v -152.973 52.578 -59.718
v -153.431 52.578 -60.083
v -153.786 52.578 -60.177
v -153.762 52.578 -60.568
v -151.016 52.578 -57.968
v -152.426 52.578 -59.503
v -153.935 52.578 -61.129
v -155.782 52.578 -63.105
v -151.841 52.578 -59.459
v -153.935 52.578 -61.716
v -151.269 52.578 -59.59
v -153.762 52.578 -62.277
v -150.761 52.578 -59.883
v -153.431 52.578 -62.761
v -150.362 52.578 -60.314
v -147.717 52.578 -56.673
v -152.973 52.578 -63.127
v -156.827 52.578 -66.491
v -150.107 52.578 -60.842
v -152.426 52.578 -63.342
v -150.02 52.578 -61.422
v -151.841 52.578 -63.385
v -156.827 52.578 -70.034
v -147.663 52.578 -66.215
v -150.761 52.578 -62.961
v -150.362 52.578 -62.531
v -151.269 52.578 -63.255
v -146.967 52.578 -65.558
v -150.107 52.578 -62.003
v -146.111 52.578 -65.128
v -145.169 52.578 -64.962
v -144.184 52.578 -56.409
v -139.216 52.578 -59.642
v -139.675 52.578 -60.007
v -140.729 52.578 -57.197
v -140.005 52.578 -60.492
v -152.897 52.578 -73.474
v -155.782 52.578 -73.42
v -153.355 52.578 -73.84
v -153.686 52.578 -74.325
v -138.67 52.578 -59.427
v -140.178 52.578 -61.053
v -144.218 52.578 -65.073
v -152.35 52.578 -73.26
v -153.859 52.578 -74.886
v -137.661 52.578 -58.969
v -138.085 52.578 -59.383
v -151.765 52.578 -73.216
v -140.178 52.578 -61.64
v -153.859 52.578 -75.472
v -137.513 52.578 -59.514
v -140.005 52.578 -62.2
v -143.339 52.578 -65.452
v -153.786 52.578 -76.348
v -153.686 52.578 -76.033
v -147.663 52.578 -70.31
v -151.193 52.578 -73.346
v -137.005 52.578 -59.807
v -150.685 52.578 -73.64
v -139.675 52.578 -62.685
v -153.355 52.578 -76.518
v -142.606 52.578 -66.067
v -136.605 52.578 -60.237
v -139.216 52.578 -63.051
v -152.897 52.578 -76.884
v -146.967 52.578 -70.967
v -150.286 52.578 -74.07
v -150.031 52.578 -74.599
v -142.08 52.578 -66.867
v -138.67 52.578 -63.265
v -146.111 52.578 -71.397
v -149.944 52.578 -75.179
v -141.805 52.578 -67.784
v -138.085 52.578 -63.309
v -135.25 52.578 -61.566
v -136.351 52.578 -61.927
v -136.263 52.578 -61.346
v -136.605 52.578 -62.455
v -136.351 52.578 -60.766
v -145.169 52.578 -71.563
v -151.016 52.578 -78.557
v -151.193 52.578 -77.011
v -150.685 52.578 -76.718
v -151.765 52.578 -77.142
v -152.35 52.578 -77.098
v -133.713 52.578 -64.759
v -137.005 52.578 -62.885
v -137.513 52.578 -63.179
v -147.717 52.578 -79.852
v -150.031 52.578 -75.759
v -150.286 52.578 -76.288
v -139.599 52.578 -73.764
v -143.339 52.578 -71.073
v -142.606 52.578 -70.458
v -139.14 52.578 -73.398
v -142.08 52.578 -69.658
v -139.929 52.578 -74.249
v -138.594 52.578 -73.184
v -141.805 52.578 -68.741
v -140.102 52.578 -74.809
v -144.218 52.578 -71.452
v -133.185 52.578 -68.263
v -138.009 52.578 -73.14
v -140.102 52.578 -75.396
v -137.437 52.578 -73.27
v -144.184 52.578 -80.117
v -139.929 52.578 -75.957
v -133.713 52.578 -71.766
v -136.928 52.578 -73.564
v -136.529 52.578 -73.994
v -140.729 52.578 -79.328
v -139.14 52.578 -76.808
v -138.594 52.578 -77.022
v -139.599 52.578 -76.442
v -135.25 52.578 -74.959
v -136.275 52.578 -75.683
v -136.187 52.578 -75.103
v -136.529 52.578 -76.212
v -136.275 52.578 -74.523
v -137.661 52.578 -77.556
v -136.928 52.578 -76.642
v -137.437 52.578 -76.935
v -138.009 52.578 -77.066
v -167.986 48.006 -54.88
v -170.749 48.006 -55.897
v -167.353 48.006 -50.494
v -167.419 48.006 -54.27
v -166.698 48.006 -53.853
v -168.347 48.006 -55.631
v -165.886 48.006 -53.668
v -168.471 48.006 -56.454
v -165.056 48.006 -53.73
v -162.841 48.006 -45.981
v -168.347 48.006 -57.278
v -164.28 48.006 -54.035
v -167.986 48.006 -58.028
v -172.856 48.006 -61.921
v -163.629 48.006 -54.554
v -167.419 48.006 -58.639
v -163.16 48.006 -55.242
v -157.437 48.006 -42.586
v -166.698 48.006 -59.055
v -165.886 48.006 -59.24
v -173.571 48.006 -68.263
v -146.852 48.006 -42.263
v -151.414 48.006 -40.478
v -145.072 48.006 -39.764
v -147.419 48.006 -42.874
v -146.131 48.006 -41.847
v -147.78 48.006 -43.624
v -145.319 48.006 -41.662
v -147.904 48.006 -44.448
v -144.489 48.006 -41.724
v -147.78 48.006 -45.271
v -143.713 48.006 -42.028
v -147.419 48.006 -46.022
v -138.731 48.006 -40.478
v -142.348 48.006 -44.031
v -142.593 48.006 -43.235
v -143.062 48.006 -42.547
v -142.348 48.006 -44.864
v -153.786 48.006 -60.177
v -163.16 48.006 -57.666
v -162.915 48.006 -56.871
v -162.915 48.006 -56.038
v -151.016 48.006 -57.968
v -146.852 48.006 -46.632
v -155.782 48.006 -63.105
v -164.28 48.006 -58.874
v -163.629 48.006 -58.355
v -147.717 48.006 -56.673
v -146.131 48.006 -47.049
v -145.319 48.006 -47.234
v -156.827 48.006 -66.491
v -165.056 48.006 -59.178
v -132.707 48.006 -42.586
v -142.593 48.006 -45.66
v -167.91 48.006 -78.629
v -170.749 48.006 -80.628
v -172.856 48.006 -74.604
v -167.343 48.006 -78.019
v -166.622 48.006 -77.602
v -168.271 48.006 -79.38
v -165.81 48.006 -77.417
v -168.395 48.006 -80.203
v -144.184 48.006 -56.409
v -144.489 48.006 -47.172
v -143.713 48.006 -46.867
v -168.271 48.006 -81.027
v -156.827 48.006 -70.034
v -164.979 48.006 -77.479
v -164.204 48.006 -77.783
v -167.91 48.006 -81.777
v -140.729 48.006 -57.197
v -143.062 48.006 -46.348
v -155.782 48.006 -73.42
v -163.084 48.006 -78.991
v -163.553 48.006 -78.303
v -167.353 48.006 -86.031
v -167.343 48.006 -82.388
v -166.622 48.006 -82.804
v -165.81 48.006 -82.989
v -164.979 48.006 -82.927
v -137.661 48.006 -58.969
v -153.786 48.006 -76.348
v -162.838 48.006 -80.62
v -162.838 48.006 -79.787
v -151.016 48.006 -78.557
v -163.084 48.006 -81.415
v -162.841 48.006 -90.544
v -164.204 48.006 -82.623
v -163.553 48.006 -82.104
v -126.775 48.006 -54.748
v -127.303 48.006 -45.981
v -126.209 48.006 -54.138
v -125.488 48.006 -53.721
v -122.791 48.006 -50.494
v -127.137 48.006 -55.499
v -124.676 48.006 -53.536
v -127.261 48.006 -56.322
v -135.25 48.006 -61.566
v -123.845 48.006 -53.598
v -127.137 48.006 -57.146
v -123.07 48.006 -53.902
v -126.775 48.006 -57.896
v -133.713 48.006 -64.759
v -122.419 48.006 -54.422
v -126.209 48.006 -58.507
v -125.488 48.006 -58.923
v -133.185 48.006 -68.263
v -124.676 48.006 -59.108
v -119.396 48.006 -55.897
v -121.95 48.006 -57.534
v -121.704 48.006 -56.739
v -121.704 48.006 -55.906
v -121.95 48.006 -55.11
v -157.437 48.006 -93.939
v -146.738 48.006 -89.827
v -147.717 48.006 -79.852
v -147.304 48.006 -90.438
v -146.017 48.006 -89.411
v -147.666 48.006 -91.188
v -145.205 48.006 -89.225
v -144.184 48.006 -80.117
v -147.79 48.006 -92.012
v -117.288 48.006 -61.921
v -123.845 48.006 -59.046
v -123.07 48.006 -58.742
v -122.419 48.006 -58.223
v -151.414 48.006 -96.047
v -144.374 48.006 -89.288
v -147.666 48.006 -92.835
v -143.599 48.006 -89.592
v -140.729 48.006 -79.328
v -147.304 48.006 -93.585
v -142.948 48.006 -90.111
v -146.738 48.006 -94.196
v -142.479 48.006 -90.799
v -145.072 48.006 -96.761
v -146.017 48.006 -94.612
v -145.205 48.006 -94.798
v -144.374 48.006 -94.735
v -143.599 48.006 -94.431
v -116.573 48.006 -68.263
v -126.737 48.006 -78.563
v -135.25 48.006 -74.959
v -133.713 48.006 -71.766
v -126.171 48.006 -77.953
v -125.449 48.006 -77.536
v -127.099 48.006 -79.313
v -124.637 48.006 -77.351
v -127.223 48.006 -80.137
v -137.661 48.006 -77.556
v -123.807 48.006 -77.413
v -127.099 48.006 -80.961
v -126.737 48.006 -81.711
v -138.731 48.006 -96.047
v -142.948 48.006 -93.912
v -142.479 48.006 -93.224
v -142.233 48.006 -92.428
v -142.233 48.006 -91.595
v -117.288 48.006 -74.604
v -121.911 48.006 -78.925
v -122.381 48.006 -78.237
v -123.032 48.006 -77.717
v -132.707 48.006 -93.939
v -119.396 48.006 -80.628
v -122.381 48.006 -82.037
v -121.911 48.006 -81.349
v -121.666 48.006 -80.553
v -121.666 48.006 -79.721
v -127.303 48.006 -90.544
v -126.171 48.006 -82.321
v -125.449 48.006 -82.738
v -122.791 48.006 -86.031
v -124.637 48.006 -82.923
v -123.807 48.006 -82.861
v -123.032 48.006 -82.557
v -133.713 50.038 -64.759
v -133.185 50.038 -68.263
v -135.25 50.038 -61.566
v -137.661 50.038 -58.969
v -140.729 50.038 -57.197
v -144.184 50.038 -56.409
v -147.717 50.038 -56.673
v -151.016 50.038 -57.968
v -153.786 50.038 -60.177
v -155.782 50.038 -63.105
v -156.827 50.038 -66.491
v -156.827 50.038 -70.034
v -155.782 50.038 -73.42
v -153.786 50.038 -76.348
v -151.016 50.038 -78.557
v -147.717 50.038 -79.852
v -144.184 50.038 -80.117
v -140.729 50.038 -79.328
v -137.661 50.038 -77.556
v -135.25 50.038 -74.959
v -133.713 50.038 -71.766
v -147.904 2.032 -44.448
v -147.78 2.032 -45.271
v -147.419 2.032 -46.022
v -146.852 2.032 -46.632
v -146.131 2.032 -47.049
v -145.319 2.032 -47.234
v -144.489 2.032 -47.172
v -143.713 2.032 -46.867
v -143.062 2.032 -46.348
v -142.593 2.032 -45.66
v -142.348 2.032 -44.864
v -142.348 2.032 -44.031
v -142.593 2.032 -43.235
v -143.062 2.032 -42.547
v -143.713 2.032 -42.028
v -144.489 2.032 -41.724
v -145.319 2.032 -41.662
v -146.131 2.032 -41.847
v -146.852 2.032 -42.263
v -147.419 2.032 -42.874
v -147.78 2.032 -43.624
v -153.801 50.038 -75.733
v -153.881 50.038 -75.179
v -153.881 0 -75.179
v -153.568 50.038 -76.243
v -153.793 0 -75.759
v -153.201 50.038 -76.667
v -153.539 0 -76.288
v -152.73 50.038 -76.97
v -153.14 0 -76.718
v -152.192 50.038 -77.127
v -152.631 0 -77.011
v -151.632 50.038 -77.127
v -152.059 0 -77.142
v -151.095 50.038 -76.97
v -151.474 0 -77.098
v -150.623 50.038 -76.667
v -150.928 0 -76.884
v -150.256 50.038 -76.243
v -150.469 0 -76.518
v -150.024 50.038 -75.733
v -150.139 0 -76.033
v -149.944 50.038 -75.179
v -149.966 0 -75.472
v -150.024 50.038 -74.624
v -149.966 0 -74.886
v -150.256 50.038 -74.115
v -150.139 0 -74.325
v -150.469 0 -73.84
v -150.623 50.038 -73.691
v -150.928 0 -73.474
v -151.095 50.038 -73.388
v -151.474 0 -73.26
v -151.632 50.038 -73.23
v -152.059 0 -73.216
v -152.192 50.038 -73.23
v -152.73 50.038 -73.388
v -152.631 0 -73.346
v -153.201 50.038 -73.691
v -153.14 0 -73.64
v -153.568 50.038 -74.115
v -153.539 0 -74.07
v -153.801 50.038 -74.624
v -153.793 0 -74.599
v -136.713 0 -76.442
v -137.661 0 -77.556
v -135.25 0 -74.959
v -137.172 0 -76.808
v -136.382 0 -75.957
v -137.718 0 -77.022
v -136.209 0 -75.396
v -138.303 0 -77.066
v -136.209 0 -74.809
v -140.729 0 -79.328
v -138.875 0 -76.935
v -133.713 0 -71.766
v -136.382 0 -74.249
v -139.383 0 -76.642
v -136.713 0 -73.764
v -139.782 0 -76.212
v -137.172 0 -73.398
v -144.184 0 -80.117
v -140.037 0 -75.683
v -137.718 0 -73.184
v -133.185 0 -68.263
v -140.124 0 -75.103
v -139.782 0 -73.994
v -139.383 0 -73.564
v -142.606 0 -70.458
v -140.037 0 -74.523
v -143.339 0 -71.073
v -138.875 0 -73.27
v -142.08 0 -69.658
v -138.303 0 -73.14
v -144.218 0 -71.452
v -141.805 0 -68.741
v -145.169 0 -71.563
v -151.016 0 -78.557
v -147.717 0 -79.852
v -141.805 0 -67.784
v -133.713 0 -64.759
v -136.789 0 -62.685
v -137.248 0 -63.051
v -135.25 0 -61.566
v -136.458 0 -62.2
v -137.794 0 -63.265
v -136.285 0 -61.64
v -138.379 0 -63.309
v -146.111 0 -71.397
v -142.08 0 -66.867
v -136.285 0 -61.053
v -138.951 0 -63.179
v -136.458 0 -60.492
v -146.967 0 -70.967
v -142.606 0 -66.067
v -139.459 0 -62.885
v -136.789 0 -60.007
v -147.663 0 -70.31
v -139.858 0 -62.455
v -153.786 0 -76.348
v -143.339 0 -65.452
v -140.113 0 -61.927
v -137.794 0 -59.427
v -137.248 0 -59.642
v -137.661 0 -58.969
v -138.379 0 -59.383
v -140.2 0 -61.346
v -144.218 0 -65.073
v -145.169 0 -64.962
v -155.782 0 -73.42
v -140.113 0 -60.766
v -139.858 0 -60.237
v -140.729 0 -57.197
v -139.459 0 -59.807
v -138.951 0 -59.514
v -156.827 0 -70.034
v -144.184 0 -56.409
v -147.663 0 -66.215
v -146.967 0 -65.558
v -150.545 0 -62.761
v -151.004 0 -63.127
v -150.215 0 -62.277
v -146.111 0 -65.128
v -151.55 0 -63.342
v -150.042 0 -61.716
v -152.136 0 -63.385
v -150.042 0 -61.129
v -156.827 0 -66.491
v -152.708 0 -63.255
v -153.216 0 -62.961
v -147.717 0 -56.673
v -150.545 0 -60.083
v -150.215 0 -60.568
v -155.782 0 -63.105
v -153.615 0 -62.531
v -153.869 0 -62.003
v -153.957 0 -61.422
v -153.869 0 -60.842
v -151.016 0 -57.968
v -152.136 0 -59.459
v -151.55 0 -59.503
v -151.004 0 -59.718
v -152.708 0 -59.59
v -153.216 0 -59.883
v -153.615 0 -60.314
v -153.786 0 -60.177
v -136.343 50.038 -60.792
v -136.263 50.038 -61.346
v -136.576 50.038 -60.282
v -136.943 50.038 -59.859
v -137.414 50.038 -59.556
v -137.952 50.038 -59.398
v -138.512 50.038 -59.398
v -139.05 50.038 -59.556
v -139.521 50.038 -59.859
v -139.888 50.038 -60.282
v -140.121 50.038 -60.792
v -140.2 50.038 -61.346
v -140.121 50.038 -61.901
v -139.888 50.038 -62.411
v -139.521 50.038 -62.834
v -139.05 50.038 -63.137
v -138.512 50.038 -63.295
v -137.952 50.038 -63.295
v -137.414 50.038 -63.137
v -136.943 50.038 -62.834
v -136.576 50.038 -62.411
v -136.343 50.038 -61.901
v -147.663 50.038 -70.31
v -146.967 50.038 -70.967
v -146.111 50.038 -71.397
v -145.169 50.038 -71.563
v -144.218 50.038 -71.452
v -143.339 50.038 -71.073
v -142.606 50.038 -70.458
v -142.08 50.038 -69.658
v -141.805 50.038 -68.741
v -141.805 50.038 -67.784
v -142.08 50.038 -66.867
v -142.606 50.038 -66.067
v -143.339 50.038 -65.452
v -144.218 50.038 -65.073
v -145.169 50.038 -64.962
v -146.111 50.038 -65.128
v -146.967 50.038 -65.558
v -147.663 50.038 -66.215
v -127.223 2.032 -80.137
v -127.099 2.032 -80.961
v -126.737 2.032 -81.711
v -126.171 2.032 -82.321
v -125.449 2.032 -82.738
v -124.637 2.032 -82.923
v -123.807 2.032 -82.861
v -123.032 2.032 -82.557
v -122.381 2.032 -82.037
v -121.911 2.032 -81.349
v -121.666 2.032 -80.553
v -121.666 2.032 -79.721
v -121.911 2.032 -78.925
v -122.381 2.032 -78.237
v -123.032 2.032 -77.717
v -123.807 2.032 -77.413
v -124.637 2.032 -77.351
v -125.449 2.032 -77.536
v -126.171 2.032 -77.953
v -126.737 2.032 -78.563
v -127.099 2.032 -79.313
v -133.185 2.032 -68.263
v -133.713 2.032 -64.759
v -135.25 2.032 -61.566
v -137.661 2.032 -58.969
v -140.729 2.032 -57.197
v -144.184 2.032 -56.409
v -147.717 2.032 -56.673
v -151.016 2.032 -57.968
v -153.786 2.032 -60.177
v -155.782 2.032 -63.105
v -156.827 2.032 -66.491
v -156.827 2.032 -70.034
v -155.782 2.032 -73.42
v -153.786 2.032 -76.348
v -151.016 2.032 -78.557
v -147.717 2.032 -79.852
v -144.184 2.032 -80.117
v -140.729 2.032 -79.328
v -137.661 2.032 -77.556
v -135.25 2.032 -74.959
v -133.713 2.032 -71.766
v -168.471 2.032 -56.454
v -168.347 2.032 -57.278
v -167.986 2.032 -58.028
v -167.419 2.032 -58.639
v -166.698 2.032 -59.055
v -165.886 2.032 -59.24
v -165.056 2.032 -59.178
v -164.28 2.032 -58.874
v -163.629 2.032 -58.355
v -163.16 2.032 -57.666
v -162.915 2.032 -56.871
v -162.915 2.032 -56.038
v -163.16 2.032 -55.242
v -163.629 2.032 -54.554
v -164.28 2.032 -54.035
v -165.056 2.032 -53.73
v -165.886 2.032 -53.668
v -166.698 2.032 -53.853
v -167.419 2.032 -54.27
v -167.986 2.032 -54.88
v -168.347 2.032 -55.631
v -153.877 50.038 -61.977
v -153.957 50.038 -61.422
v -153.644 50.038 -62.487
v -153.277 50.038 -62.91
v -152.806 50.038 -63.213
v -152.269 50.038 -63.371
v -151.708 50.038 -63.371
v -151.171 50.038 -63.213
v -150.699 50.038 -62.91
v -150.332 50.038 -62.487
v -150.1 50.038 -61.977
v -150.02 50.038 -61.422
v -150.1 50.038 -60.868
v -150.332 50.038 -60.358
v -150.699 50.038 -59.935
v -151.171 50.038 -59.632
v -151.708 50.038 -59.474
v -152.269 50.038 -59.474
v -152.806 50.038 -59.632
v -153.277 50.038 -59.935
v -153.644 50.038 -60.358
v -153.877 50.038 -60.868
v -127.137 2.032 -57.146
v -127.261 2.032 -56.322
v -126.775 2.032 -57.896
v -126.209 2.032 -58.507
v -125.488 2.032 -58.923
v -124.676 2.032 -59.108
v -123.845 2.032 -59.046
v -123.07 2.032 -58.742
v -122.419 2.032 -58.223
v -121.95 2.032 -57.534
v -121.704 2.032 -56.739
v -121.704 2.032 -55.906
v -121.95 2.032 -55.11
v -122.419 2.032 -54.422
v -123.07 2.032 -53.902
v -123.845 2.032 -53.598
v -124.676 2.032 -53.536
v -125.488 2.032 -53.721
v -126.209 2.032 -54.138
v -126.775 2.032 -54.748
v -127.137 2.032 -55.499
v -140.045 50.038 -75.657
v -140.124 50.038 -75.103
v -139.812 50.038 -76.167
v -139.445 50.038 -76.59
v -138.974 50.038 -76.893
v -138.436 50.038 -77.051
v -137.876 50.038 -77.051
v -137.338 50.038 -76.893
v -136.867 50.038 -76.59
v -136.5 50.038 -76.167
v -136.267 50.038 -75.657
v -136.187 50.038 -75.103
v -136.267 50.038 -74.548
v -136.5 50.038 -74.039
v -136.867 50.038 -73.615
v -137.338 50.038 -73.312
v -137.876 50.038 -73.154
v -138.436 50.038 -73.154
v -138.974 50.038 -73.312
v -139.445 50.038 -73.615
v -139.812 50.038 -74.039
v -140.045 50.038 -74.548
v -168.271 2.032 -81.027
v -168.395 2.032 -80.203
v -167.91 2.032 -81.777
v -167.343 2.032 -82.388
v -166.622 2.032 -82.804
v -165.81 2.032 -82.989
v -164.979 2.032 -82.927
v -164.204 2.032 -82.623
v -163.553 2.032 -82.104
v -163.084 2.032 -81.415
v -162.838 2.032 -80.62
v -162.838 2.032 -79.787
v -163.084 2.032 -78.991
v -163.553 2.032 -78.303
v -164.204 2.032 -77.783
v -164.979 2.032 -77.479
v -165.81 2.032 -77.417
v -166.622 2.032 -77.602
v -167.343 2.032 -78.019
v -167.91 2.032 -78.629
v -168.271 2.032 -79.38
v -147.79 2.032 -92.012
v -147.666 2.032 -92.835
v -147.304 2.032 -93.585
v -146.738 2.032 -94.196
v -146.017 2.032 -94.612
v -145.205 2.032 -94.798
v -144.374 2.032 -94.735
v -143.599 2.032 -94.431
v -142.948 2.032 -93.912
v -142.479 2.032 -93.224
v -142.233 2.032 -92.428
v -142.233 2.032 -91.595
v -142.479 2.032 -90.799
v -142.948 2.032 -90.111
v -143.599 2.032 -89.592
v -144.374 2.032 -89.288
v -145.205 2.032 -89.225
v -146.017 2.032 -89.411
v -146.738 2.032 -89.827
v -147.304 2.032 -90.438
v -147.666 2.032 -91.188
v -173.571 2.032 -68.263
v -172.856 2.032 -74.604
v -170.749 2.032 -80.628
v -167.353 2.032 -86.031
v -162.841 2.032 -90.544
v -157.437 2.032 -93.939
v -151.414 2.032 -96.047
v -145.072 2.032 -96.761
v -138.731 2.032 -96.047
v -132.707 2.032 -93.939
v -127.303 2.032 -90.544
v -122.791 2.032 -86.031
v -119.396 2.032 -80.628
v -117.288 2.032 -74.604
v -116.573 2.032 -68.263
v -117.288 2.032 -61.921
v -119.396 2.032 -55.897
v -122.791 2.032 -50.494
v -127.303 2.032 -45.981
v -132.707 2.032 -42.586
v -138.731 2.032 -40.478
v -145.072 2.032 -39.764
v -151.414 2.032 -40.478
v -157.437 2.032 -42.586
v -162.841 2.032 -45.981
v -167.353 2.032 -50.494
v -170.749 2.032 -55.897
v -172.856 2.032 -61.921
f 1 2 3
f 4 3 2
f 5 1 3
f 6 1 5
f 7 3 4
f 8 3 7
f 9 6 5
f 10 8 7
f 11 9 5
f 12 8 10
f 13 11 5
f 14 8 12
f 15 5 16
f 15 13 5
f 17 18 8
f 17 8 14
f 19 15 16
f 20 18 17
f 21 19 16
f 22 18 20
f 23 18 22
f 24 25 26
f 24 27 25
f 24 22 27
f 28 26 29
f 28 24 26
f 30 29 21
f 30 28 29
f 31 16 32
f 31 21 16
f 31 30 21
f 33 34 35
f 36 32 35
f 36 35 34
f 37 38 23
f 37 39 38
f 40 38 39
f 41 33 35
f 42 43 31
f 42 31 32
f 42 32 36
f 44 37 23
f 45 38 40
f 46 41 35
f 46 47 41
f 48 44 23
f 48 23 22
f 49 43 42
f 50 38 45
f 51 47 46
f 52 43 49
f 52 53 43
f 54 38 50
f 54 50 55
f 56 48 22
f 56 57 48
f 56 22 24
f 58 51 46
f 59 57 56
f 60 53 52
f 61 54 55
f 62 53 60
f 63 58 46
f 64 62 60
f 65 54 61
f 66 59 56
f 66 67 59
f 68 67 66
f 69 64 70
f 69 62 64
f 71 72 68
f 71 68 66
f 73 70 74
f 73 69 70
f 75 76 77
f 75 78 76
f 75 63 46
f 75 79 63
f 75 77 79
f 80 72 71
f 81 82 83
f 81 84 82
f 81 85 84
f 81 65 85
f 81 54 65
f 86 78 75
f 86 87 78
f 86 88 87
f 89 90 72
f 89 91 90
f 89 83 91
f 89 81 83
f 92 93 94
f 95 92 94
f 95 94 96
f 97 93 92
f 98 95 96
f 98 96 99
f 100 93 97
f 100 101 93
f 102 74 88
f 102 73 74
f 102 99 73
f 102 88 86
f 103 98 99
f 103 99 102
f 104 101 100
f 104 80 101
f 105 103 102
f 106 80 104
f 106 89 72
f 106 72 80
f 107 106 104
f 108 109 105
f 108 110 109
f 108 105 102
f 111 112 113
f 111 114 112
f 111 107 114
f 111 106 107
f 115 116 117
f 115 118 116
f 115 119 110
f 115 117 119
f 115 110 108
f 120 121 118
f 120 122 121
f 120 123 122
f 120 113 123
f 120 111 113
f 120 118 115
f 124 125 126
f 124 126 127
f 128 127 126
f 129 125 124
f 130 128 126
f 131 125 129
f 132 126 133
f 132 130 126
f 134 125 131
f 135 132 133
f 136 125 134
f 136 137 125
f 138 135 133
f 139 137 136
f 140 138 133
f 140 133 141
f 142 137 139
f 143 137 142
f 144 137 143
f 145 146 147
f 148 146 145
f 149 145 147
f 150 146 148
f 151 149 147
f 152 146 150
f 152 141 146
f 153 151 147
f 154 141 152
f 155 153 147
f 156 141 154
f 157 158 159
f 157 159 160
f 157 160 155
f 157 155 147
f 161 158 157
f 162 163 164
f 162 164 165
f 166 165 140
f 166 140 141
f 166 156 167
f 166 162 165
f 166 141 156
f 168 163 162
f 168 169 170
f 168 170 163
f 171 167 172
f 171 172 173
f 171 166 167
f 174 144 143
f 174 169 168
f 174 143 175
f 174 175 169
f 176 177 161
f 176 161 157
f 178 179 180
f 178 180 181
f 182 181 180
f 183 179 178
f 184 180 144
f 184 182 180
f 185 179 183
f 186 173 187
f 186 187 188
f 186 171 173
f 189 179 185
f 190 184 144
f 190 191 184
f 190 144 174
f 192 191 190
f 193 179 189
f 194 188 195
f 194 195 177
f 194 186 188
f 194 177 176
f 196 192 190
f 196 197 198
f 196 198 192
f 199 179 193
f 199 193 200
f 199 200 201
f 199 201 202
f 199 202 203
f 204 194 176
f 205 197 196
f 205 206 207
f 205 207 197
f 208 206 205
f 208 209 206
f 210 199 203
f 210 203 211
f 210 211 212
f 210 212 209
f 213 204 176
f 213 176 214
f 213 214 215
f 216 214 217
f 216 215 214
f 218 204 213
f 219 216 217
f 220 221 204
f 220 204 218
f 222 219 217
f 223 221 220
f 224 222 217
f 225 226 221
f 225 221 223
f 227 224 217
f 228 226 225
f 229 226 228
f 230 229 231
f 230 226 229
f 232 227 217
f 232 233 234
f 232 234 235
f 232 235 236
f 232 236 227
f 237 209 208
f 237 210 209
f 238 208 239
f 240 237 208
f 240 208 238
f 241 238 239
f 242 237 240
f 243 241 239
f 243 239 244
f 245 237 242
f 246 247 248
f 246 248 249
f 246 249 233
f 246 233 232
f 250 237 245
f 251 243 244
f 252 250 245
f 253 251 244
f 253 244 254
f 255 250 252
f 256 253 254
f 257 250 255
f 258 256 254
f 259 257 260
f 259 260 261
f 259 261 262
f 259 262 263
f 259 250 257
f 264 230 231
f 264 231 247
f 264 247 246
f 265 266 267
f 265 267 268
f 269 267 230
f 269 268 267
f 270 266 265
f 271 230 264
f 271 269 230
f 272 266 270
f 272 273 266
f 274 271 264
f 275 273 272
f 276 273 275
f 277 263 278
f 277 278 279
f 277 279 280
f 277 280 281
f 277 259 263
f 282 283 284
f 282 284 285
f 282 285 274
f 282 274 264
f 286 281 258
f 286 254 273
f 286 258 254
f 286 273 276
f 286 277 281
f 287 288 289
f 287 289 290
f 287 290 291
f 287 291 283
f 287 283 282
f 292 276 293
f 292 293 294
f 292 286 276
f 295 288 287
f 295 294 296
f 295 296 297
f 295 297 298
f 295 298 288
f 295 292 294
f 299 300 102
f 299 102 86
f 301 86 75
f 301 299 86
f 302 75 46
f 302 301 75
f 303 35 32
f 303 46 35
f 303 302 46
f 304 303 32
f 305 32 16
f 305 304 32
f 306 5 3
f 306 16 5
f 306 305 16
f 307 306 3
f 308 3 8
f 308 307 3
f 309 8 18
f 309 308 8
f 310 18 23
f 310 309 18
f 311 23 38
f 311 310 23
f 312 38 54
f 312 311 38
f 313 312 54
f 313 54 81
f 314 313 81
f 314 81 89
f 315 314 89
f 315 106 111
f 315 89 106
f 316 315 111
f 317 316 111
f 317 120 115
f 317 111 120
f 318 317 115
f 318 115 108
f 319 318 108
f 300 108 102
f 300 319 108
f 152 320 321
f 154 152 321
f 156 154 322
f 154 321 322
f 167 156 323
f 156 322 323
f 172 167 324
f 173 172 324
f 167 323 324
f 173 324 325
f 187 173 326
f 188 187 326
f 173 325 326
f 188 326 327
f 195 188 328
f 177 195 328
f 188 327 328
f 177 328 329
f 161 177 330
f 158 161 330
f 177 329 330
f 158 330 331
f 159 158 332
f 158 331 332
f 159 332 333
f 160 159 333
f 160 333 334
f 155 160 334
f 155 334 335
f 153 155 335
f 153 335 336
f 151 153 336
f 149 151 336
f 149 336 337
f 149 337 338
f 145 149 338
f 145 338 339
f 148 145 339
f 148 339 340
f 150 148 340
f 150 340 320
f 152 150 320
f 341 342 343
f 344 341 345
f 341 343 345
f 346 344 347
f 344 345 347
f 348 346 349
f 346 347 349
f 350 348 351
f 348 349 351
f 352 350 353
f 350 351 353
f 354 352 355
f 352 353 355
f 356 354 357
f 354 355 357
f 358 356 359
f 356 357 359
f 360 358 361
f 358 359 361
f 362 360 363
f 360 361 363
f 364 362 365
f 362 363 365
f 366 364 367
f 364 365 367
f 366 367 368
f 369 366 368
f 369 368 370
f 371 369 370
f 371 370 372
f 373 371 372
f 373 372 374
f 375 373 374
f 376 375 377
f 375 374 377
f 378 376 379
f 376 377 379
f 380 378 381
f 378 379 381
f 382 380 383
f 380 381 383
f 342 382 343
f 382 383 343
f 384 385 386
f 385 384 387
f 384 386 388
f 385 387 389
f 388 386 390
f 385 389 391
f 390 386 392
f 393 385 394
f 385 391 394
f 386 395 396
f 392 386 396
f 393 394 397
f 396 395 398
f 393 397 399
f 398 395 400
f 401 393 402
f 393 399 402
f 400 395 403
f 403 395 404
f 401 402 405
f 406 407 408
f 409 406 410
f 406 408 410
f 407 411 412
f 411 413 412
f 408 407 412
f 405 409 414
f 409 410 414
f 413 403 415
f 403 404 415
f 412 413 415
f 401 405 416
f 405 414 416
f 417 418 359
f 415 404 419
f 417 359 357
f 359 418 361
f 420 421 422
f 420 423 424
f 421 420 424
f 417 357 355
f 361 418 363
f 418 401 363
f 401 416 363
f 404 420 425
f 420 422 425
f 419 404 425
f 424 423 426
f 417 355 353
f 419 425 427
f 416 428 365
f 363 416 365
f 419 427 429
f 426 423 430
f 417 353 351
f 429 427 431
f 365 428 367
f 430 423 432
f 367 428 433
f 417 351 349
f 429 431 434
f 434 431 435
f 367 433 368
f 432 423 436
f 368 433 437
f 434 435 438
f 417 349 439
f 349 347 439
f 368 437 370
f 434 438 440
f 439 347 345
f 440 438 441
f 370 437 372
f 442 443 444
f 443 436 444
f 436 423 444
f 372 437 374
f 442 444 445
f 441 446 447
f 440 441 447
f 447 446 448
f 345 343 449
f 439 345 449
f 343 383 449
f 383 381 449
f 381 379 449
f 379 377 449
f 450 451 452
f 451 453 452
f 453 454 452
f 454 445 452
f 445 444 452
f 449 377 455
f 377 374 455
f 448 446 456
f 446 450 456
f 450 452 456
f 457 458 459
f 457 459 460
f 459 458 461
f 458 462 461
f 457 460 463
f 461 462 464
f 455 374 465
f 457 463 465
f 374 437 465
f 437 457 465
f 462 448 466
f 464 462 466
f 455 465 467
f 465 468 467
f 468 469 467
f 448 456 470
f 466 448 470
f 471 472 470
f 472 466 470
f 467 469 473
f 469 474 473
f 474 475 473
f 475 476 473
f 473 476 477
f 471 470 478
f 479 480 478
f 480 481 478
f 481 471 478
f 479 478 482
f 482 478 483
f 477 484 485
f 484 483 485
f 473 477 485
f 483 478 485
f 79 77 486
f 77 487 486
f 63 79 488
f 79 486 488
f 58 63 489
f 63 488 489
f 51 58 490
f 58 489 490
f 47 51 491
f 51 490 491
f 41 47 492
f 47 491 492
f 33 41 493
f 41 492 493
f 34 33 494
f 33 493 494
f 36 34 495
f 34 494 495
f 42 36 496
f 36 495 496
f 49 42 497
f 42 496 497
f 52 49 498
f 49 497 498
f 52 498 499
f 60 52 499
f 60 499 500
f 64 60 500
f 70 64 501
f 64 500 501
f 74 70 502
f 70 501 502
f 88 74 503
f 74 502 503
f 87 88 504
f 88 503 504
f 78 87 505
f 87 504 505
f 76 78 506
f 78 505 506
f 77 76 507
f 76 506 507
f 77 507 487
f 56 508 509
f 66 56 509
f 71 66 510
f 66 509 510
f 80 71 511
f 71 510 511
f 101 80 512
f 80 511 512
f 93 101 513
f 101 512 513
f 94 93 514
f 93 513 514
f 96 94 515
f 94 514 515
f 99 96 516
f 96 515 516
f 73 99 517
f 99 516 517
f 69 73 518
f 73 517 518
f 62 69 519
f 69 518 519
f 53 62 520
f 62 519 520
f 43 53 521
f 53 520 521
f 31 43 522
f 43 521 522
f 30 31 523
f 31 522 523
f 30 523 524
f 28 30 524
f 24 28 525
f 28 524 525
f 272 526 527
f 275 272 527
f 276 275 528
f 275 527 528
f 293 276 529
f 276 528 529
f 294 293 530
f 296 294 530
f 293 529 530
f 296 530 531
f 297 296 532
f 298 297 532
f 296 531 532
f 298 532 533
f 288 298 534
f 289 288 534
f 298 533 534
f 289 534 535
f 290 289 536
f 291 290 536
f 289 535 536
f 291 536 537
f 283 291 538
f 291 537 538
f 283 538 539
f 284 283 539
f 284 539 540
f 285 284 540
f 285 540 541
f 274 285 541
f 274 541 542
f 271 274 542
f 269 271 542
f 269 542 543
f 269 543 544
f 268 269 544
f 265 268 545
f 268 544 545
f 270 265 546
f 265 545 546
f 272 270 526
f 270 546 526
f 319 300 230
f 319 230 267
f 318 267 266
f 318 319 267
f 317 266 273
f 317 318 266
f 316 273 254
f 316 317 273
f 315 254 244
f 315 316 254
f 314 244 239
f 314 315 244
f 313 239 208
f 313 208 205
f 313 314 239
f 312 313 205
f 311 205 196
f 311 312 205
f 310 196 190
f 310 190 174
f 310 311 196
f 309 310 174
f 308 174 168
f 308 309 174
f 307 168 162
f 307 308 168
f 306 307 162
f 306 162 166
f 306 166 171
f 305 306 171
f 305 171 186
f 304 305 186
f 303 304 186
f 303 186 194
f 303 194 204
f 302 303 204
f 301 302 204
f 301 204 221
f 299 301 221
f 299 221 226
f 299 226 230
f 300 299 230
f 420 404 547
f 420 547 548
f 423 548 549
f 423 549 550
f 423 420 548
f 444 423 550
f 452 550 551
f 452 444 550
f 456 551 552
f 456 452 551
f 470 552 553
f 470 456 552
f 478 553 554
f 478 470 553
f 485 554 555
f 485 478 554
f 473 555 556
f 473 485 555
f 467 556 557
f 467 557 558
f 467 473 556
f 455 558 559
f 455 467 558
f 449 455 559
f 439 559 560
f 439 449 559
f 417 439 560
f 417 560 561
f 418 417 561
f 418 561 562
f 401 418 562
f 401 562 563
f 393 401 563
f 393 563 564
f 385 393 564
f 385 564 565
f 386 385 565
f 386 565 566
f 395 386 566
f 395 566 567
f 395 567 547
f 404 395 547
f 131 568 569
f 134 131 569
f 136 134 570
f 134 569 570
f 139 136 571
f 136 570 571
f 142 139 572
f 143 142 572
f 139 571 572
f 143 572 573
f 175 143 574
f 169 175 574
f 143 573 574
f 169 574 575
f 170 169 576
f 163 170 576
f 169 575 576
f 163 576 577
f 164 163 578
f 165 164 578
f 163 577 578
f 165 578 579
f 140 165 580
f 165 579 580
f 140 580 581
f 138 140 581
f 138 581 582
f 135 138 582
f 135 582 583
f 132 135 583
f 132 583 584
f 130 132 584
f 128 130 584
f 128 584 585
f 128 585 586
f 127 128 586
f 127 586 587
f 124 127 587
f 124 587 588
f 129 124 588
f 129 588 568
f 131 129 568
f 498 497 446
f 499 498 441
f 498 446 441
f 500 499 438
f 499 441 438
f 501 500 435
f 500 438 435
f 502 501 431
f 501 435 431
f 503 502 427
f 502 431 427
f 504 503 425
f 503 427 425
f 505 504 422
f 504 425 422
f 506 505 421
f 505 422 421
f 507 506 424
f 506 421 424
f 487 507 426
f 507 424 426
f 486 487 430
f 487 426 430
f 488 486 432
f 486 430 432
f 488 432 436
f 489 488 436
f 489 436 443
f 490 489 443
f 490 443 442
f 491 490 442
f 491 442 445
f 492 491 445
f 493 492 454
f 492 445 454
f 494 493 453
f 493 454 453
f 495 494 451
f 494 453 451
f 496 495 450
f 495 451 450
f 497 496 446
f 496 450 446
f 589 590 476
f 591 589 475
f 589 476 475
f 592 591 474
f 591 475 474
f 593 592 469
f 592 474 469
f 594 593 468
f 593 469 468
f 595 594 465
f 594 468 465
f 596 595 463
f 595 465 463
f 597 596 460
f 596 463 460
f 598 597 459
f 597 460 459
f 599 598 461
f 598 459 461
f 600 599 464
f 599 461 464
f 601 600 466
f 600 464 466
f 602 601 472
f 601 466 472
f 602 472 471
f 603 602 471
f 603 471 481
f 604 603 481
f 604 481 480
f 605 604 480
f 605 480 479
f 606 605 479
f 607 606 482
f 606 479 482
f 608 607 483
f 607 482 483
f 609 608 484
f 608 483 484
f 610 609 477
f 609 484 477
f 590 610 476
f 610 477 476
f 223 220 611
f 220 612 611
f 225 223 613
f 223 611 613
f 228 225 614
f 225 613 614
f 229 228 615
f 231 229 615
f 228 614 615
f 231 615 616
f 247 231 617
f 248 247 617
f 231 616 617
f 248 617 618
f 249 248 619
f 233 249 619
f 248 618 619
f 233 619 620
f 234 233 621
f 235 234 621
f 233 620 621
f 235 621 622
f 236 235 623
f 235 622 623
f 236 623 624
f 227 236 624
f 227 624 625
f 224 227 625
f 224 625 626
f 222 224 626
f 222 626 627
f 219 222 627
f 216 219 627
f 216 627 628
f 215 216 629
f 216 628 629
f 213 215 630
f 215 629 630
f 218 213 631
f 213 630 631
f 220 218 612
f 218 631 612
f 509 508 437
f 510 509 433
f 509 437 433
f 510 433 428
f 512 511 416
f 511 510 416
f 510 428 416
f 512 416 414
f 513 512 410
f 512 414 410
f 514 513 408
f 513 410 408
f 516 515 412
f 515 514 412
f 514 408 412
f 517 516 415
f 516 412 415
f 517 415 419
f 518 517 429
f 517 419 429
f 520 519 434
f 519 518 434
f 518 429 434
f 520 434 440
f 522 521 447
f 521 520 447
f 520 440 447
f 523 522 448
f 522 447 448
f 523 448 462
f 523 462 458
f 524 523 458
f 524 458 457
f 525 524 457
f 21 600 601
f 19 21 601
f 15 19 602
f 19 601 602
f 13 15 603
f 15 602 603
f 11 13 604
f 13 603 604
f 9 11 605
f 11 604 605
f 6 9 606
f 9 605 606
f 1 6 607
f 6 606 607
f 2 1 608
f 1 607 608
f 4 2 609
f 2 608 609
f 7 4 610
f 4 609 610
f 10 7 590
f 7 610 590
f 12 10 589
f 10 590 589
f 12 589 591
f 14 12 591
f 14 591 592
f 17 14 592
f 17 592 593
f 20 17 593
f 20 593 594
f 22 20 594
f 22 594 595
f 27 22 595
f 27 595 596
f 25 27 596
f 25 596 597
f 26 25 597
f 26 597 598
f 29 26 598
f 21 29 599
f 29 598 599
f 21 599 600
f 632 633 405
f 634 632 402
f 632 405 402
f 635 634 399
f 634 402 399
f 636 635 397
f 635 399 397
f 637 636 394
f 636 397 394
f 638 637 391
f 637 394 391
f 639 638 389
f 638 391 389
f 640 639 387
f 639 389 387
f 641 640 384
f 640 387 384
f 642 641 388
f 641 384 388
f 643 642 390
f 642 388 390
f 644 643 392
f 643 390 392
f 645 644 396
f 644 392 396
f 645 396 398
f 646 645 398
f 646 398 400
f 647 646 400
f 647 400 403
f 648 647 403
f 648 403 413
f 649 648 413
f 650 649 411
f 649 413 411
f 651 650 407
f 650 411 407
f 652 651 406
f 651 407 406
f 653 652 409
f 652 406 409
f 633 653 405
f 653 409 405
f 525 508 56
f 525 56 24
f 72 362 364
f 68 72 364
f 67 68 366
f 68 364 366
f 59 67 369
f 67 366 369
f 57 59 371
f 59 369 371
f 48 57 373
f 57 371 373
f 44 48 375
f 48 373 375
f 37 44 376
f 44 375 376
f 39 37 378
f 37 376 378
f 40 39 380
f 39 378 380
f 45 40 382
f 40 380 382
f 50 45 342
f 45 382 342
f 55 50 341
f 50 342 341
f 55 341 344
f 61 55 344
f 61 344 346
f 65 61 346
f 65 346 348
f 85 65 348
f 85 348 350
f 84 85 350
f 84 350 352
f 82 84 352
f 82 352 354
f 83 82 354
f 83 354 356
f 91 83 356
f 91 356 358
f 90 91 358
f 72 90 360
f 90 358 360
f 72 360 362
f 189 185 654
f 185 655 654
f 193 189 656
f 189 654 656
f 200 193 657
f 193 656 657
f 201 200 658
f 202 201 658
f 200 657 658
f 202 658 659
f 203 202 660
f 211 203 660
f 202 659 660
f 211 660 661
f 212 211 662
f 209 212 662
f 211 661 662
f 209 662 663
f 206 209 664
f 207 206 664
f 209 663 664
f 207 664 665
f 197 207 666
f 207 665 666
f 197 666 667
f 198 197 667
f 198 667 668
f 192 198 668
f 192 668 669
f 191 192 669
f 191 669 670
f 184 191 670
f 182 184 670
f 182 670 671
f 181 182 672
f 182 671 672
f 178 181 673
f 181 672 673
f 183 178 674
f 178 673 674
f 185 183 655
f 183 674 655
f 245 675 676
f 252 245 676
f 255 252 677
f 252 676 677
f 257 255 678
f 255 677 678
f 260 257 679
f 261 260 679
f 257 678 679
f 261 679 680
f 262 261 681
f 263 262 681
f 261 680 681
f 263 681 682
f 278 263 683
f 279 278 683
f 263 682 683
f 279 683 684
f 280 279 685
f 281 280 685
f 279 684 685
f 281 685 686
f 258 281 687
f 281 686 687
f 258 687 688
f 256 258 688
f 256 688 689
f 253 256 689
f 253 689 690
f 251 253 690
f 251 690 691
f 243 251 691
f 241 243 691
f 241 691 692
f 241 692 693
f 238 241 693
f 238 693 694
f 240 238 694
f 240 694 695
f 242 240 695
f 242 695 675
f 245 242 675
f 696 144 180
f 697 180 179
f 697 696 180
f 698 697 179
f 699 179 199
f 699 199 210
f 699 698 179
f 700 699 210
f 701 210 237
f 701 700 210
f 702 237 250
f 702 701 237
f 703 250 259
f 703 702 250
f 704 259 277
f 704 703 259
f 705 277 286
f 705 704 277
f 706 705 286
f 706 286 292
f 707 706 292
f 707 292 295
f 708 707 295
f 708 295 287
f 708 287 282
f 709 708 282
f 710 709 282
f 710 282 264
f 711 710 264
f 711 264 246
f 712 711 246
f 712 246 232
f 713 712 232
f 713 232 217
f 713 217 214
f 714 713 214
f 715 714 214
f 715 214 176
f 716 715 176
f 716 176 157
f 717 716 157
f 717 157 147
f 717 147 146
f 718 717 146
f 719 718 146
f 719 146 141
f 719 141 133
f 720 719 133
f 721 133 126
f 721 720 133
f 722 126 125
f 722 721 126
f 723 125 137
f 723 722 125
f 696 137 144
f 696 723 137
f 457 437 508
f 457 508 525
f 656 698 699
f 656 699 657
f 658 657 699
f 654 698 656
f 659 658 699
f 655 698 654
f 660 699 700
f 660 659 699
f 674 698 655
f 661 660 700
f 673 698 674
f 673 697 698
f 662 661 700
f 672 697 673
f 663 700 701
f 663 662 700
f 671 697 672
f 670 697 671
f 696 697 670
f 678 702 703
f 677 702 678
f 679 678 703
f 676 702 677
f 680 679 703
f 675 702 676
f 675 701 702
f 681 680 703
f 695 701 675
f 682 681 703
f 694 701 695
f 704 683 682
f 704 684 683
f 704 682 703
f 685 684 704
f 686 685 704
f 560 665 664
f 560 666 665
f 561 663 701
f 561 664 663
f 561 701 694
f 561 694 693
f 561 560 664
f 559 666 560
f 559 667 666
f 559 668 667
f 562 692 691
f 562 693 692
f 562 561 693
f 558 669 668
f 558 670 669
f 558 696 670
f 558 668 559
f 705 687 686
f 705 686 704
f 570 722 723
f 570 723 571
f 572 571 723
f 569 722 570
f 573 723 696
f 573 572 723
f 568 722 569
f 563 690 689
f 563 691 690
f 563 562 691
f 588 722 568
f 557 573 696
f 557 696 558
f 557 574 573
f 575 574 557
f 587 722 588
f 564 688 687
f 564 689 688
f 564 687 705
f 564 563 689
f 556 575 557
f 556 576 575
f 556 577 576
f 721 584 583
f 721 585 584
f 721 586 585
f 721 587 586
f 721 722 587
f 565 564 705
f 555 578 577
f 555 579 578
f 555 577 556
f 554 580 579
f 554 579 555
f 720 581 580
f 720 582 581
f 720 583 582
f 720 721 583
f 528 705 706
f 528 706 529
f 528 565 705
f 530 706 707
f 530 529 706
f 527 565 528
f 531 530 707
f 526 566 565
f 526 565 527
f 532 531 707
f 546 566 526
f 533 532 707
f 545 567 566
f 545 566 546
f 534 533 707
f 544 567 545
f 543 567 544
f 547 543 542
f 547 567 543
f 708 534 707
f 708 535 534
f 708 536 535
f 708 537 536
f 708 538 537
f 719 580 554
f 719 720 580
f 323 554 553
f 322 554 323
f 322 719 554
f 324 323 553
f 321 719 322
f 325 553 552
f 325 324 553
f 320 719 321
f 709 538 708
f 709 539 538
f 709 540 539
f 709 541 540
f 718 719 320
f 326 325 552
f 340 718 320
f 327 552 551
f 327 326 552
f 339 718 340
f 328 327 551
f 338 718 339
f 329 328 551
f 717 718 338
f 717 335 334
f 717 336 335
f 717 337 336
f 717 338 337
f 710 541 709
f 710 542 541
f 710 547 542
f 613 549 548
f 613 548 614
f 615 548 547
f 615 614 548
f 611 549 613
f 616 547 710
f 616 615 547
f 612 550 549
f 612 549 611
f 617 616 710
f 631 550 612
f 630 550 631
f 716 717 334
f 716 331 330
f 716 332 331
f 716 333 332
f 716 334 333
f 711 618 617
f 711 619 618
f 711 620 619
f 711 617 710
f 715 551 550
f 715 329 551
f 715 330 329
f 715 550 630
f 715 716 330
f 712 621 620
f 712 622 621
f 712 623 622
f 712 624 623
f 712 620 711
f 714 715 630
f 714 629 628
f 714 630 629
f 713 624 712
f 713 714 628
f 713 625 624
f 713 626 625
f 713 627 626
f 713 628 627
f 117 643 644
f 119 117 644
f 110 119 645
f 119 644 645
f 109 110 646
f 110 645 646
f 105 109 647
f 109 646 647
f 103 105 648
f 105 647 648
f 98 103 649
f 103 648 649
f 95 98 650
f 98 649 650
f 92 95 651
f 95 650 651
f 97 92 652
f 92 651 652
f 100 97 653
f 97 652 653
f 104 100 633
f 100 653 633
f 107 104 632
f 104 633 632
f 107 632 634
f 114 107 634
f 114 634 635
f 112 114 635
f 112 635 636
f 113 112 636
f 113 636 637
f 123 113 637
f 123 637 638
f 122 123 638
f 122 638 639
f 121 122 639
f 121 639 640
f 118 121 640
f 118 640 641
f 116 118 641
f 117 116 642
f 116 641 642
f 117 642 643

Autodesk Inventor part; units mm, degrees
ref_plane "YZ Plane" through (0, 0, 0) normal (1, 0, 0) x (0, 1, 0)
ref_plane "XZ Plane" through (0, 0, 0) normal (0, 1, 0) x (-1, 0, 0)
ref_plane "XY Plane" through (0, 0, 0) normal (0, 0, 1) x (1, 0, 0)
sketch "Sketch1" plane through (0, 0, 0) normal (0, 1, 0) x (-1, 0, 0)
  circle A0 centre (145.0721, -68.2626) radius 28.4988
  arc A1 (147.6629, -66.2154) -> (147.6629, -70.3098) centre (145.0721, -68.2626) ccw
  line L0 (147.6629, -70.3098) -> (147.6629, -66.2154)
  circle A2 centre (144.9959, -92.0115) radius 2.794
  circle A3 centre (145.1103, -44.4477) radius 2.794
  circle A4 centre (165.6011, -80.2031) radius 2.794
  circle A5 centre (124.4669, -56.3221) radius 2.794
  circle A6 centre (165.6773, -56.4542) radius 2.794
  circle A7 centre (124.4287, -80.137) radius 2.794
  circle A8 centre (145.1483, -44.5137) radius 2.794
  circle A9 centre (145.0339, -92.0776) radius 2.794
  circle A10 centre (124.5431, -56.3222) radius 2.794
  circle A11 centre (165.6773, -80.2032) radius 2.794
  circle A12 centre (124.4669, -80.0711) radius 2.794
  circle A13 centre (165.7155, -56.3882) radius 2.794
  circle A14 centre (151.9123, -75.1789) radius 1.9685
  circle A15 centre (151.9884, -61.4224) radius 1.9685
  circle A16 centre (138.2319, -61.3463) radius 1.9685
  circle A17 centre (138.1558, -75.1028) radius 1.9685
  point P0 (0, 0)
  dimension "d1" = 6.604
  dimension "d3" = 5.588
  dimension "d4" = 23.749
  dimension "d7" = 360
  dimension "d9" = 3.937
  dimension "d14" = 360
  dimension "d25" = 2.5908
extrude "Extrusion1" add sketch "Sketch1" along normal blind 50.038 contours A0 | A2 A9 | A3 A8 | A4 A11 | A5 A10 | A6 A13 | A7 A12 picked at (146.4388, -94.4143) picked at (146.5538, -46.8501) picked at (168.4221, -80.4123) picked at (127.2879, -56.5313) picked at (167.123, -54.0531) picked at (125.875, -77.7363)
sketch "Sketch2" plane through (-145.0721, 50.038, -68.2626) normal (0, 1, 0) x (1, 0, 0)
  circle A0 centre (0, 0) radius 11.8872
  circle A1 centre (0, 0) radius 28.4988
  point P0 (145.0721, -68.2626)
  dimension "d18" = 23.7744
extrude "Extrusion2" cut sketch "Sketch2" against normal blind 2.032
sketch "Sketch3" plane through (-145.0721, 0, -68.2626) normal (0, -1, 0) x (1, 0, 0)
  arc A0 (-2.5908, -2.0472) -> (-2.5908, 2.0472) centre (0, 0) ccw projected
  circle A1 centre (0, 0) radius 11.8872
  circle A2 centre (0, 0) radius 28.4988
  point P0 (145.0721, 68.2626)
extrude "Extrusion3" cut sketch "Sketch3" against normal blind 2.032
sketch "Sketch4" plane through (-145.0721, 50.038, -68.2626) normal (0, 1, 0) x (1, 0, 0)
  circle A0 centre (0, 0) radius 11.8872 construction
  circle A1 centre (6.9163, 6.8402) radius 1.9685 construction
  circle A2 centre (-6.8402, 6.9163) radius 1.9685 construction
  circle A3 centre (-6.9163, -6.8402) radius 1.9685 construction
  circle A4 centre (6.8402, -6.9163) radius 1.9685 construction
  arc A5 (-2.5908, -2.0472) -> (-2.5908, 2.0472) centre (0, 0) ccw construction
  line L0 (-2.5908, -2.0472) -> (-2.5908, 2.0472) construction
  arc A6 (-2.5908, -2.0472) -> (-2.5908, 2.0472) centre (0, 0) ccw projected
  arc A7 (-2.5908, -2.0472) -> (-2.5908, 2.0472) centre (0, 0) ccw
  circle A8 centre (0, 0) radius 11.8872
  circle A9 centre (-6.8402, 6.9163) radius 1.9685
  circle A10 centre (6.9163, 6.8402) radius 1.9685 projected
  circle A11 centre (6.9163, 6.8402) radius 1.9685
  circle A12 centre (-6.9163, -6.8402) radius 1.9685
  circle A13 centre (6.8402, -6.9163) radius 1.9685
  line L1 (-2.5908, 2.0472) -> (-2.5908, -2.0472)
  point P0 (145.0721, -68.2626)
  dimension "d26" = 3.302
  dimension "d27" = 2.5908
extrude "Extrusion4" add sketch "Sketch4" along normal blind 2.54
properties part number "wheel insert"
